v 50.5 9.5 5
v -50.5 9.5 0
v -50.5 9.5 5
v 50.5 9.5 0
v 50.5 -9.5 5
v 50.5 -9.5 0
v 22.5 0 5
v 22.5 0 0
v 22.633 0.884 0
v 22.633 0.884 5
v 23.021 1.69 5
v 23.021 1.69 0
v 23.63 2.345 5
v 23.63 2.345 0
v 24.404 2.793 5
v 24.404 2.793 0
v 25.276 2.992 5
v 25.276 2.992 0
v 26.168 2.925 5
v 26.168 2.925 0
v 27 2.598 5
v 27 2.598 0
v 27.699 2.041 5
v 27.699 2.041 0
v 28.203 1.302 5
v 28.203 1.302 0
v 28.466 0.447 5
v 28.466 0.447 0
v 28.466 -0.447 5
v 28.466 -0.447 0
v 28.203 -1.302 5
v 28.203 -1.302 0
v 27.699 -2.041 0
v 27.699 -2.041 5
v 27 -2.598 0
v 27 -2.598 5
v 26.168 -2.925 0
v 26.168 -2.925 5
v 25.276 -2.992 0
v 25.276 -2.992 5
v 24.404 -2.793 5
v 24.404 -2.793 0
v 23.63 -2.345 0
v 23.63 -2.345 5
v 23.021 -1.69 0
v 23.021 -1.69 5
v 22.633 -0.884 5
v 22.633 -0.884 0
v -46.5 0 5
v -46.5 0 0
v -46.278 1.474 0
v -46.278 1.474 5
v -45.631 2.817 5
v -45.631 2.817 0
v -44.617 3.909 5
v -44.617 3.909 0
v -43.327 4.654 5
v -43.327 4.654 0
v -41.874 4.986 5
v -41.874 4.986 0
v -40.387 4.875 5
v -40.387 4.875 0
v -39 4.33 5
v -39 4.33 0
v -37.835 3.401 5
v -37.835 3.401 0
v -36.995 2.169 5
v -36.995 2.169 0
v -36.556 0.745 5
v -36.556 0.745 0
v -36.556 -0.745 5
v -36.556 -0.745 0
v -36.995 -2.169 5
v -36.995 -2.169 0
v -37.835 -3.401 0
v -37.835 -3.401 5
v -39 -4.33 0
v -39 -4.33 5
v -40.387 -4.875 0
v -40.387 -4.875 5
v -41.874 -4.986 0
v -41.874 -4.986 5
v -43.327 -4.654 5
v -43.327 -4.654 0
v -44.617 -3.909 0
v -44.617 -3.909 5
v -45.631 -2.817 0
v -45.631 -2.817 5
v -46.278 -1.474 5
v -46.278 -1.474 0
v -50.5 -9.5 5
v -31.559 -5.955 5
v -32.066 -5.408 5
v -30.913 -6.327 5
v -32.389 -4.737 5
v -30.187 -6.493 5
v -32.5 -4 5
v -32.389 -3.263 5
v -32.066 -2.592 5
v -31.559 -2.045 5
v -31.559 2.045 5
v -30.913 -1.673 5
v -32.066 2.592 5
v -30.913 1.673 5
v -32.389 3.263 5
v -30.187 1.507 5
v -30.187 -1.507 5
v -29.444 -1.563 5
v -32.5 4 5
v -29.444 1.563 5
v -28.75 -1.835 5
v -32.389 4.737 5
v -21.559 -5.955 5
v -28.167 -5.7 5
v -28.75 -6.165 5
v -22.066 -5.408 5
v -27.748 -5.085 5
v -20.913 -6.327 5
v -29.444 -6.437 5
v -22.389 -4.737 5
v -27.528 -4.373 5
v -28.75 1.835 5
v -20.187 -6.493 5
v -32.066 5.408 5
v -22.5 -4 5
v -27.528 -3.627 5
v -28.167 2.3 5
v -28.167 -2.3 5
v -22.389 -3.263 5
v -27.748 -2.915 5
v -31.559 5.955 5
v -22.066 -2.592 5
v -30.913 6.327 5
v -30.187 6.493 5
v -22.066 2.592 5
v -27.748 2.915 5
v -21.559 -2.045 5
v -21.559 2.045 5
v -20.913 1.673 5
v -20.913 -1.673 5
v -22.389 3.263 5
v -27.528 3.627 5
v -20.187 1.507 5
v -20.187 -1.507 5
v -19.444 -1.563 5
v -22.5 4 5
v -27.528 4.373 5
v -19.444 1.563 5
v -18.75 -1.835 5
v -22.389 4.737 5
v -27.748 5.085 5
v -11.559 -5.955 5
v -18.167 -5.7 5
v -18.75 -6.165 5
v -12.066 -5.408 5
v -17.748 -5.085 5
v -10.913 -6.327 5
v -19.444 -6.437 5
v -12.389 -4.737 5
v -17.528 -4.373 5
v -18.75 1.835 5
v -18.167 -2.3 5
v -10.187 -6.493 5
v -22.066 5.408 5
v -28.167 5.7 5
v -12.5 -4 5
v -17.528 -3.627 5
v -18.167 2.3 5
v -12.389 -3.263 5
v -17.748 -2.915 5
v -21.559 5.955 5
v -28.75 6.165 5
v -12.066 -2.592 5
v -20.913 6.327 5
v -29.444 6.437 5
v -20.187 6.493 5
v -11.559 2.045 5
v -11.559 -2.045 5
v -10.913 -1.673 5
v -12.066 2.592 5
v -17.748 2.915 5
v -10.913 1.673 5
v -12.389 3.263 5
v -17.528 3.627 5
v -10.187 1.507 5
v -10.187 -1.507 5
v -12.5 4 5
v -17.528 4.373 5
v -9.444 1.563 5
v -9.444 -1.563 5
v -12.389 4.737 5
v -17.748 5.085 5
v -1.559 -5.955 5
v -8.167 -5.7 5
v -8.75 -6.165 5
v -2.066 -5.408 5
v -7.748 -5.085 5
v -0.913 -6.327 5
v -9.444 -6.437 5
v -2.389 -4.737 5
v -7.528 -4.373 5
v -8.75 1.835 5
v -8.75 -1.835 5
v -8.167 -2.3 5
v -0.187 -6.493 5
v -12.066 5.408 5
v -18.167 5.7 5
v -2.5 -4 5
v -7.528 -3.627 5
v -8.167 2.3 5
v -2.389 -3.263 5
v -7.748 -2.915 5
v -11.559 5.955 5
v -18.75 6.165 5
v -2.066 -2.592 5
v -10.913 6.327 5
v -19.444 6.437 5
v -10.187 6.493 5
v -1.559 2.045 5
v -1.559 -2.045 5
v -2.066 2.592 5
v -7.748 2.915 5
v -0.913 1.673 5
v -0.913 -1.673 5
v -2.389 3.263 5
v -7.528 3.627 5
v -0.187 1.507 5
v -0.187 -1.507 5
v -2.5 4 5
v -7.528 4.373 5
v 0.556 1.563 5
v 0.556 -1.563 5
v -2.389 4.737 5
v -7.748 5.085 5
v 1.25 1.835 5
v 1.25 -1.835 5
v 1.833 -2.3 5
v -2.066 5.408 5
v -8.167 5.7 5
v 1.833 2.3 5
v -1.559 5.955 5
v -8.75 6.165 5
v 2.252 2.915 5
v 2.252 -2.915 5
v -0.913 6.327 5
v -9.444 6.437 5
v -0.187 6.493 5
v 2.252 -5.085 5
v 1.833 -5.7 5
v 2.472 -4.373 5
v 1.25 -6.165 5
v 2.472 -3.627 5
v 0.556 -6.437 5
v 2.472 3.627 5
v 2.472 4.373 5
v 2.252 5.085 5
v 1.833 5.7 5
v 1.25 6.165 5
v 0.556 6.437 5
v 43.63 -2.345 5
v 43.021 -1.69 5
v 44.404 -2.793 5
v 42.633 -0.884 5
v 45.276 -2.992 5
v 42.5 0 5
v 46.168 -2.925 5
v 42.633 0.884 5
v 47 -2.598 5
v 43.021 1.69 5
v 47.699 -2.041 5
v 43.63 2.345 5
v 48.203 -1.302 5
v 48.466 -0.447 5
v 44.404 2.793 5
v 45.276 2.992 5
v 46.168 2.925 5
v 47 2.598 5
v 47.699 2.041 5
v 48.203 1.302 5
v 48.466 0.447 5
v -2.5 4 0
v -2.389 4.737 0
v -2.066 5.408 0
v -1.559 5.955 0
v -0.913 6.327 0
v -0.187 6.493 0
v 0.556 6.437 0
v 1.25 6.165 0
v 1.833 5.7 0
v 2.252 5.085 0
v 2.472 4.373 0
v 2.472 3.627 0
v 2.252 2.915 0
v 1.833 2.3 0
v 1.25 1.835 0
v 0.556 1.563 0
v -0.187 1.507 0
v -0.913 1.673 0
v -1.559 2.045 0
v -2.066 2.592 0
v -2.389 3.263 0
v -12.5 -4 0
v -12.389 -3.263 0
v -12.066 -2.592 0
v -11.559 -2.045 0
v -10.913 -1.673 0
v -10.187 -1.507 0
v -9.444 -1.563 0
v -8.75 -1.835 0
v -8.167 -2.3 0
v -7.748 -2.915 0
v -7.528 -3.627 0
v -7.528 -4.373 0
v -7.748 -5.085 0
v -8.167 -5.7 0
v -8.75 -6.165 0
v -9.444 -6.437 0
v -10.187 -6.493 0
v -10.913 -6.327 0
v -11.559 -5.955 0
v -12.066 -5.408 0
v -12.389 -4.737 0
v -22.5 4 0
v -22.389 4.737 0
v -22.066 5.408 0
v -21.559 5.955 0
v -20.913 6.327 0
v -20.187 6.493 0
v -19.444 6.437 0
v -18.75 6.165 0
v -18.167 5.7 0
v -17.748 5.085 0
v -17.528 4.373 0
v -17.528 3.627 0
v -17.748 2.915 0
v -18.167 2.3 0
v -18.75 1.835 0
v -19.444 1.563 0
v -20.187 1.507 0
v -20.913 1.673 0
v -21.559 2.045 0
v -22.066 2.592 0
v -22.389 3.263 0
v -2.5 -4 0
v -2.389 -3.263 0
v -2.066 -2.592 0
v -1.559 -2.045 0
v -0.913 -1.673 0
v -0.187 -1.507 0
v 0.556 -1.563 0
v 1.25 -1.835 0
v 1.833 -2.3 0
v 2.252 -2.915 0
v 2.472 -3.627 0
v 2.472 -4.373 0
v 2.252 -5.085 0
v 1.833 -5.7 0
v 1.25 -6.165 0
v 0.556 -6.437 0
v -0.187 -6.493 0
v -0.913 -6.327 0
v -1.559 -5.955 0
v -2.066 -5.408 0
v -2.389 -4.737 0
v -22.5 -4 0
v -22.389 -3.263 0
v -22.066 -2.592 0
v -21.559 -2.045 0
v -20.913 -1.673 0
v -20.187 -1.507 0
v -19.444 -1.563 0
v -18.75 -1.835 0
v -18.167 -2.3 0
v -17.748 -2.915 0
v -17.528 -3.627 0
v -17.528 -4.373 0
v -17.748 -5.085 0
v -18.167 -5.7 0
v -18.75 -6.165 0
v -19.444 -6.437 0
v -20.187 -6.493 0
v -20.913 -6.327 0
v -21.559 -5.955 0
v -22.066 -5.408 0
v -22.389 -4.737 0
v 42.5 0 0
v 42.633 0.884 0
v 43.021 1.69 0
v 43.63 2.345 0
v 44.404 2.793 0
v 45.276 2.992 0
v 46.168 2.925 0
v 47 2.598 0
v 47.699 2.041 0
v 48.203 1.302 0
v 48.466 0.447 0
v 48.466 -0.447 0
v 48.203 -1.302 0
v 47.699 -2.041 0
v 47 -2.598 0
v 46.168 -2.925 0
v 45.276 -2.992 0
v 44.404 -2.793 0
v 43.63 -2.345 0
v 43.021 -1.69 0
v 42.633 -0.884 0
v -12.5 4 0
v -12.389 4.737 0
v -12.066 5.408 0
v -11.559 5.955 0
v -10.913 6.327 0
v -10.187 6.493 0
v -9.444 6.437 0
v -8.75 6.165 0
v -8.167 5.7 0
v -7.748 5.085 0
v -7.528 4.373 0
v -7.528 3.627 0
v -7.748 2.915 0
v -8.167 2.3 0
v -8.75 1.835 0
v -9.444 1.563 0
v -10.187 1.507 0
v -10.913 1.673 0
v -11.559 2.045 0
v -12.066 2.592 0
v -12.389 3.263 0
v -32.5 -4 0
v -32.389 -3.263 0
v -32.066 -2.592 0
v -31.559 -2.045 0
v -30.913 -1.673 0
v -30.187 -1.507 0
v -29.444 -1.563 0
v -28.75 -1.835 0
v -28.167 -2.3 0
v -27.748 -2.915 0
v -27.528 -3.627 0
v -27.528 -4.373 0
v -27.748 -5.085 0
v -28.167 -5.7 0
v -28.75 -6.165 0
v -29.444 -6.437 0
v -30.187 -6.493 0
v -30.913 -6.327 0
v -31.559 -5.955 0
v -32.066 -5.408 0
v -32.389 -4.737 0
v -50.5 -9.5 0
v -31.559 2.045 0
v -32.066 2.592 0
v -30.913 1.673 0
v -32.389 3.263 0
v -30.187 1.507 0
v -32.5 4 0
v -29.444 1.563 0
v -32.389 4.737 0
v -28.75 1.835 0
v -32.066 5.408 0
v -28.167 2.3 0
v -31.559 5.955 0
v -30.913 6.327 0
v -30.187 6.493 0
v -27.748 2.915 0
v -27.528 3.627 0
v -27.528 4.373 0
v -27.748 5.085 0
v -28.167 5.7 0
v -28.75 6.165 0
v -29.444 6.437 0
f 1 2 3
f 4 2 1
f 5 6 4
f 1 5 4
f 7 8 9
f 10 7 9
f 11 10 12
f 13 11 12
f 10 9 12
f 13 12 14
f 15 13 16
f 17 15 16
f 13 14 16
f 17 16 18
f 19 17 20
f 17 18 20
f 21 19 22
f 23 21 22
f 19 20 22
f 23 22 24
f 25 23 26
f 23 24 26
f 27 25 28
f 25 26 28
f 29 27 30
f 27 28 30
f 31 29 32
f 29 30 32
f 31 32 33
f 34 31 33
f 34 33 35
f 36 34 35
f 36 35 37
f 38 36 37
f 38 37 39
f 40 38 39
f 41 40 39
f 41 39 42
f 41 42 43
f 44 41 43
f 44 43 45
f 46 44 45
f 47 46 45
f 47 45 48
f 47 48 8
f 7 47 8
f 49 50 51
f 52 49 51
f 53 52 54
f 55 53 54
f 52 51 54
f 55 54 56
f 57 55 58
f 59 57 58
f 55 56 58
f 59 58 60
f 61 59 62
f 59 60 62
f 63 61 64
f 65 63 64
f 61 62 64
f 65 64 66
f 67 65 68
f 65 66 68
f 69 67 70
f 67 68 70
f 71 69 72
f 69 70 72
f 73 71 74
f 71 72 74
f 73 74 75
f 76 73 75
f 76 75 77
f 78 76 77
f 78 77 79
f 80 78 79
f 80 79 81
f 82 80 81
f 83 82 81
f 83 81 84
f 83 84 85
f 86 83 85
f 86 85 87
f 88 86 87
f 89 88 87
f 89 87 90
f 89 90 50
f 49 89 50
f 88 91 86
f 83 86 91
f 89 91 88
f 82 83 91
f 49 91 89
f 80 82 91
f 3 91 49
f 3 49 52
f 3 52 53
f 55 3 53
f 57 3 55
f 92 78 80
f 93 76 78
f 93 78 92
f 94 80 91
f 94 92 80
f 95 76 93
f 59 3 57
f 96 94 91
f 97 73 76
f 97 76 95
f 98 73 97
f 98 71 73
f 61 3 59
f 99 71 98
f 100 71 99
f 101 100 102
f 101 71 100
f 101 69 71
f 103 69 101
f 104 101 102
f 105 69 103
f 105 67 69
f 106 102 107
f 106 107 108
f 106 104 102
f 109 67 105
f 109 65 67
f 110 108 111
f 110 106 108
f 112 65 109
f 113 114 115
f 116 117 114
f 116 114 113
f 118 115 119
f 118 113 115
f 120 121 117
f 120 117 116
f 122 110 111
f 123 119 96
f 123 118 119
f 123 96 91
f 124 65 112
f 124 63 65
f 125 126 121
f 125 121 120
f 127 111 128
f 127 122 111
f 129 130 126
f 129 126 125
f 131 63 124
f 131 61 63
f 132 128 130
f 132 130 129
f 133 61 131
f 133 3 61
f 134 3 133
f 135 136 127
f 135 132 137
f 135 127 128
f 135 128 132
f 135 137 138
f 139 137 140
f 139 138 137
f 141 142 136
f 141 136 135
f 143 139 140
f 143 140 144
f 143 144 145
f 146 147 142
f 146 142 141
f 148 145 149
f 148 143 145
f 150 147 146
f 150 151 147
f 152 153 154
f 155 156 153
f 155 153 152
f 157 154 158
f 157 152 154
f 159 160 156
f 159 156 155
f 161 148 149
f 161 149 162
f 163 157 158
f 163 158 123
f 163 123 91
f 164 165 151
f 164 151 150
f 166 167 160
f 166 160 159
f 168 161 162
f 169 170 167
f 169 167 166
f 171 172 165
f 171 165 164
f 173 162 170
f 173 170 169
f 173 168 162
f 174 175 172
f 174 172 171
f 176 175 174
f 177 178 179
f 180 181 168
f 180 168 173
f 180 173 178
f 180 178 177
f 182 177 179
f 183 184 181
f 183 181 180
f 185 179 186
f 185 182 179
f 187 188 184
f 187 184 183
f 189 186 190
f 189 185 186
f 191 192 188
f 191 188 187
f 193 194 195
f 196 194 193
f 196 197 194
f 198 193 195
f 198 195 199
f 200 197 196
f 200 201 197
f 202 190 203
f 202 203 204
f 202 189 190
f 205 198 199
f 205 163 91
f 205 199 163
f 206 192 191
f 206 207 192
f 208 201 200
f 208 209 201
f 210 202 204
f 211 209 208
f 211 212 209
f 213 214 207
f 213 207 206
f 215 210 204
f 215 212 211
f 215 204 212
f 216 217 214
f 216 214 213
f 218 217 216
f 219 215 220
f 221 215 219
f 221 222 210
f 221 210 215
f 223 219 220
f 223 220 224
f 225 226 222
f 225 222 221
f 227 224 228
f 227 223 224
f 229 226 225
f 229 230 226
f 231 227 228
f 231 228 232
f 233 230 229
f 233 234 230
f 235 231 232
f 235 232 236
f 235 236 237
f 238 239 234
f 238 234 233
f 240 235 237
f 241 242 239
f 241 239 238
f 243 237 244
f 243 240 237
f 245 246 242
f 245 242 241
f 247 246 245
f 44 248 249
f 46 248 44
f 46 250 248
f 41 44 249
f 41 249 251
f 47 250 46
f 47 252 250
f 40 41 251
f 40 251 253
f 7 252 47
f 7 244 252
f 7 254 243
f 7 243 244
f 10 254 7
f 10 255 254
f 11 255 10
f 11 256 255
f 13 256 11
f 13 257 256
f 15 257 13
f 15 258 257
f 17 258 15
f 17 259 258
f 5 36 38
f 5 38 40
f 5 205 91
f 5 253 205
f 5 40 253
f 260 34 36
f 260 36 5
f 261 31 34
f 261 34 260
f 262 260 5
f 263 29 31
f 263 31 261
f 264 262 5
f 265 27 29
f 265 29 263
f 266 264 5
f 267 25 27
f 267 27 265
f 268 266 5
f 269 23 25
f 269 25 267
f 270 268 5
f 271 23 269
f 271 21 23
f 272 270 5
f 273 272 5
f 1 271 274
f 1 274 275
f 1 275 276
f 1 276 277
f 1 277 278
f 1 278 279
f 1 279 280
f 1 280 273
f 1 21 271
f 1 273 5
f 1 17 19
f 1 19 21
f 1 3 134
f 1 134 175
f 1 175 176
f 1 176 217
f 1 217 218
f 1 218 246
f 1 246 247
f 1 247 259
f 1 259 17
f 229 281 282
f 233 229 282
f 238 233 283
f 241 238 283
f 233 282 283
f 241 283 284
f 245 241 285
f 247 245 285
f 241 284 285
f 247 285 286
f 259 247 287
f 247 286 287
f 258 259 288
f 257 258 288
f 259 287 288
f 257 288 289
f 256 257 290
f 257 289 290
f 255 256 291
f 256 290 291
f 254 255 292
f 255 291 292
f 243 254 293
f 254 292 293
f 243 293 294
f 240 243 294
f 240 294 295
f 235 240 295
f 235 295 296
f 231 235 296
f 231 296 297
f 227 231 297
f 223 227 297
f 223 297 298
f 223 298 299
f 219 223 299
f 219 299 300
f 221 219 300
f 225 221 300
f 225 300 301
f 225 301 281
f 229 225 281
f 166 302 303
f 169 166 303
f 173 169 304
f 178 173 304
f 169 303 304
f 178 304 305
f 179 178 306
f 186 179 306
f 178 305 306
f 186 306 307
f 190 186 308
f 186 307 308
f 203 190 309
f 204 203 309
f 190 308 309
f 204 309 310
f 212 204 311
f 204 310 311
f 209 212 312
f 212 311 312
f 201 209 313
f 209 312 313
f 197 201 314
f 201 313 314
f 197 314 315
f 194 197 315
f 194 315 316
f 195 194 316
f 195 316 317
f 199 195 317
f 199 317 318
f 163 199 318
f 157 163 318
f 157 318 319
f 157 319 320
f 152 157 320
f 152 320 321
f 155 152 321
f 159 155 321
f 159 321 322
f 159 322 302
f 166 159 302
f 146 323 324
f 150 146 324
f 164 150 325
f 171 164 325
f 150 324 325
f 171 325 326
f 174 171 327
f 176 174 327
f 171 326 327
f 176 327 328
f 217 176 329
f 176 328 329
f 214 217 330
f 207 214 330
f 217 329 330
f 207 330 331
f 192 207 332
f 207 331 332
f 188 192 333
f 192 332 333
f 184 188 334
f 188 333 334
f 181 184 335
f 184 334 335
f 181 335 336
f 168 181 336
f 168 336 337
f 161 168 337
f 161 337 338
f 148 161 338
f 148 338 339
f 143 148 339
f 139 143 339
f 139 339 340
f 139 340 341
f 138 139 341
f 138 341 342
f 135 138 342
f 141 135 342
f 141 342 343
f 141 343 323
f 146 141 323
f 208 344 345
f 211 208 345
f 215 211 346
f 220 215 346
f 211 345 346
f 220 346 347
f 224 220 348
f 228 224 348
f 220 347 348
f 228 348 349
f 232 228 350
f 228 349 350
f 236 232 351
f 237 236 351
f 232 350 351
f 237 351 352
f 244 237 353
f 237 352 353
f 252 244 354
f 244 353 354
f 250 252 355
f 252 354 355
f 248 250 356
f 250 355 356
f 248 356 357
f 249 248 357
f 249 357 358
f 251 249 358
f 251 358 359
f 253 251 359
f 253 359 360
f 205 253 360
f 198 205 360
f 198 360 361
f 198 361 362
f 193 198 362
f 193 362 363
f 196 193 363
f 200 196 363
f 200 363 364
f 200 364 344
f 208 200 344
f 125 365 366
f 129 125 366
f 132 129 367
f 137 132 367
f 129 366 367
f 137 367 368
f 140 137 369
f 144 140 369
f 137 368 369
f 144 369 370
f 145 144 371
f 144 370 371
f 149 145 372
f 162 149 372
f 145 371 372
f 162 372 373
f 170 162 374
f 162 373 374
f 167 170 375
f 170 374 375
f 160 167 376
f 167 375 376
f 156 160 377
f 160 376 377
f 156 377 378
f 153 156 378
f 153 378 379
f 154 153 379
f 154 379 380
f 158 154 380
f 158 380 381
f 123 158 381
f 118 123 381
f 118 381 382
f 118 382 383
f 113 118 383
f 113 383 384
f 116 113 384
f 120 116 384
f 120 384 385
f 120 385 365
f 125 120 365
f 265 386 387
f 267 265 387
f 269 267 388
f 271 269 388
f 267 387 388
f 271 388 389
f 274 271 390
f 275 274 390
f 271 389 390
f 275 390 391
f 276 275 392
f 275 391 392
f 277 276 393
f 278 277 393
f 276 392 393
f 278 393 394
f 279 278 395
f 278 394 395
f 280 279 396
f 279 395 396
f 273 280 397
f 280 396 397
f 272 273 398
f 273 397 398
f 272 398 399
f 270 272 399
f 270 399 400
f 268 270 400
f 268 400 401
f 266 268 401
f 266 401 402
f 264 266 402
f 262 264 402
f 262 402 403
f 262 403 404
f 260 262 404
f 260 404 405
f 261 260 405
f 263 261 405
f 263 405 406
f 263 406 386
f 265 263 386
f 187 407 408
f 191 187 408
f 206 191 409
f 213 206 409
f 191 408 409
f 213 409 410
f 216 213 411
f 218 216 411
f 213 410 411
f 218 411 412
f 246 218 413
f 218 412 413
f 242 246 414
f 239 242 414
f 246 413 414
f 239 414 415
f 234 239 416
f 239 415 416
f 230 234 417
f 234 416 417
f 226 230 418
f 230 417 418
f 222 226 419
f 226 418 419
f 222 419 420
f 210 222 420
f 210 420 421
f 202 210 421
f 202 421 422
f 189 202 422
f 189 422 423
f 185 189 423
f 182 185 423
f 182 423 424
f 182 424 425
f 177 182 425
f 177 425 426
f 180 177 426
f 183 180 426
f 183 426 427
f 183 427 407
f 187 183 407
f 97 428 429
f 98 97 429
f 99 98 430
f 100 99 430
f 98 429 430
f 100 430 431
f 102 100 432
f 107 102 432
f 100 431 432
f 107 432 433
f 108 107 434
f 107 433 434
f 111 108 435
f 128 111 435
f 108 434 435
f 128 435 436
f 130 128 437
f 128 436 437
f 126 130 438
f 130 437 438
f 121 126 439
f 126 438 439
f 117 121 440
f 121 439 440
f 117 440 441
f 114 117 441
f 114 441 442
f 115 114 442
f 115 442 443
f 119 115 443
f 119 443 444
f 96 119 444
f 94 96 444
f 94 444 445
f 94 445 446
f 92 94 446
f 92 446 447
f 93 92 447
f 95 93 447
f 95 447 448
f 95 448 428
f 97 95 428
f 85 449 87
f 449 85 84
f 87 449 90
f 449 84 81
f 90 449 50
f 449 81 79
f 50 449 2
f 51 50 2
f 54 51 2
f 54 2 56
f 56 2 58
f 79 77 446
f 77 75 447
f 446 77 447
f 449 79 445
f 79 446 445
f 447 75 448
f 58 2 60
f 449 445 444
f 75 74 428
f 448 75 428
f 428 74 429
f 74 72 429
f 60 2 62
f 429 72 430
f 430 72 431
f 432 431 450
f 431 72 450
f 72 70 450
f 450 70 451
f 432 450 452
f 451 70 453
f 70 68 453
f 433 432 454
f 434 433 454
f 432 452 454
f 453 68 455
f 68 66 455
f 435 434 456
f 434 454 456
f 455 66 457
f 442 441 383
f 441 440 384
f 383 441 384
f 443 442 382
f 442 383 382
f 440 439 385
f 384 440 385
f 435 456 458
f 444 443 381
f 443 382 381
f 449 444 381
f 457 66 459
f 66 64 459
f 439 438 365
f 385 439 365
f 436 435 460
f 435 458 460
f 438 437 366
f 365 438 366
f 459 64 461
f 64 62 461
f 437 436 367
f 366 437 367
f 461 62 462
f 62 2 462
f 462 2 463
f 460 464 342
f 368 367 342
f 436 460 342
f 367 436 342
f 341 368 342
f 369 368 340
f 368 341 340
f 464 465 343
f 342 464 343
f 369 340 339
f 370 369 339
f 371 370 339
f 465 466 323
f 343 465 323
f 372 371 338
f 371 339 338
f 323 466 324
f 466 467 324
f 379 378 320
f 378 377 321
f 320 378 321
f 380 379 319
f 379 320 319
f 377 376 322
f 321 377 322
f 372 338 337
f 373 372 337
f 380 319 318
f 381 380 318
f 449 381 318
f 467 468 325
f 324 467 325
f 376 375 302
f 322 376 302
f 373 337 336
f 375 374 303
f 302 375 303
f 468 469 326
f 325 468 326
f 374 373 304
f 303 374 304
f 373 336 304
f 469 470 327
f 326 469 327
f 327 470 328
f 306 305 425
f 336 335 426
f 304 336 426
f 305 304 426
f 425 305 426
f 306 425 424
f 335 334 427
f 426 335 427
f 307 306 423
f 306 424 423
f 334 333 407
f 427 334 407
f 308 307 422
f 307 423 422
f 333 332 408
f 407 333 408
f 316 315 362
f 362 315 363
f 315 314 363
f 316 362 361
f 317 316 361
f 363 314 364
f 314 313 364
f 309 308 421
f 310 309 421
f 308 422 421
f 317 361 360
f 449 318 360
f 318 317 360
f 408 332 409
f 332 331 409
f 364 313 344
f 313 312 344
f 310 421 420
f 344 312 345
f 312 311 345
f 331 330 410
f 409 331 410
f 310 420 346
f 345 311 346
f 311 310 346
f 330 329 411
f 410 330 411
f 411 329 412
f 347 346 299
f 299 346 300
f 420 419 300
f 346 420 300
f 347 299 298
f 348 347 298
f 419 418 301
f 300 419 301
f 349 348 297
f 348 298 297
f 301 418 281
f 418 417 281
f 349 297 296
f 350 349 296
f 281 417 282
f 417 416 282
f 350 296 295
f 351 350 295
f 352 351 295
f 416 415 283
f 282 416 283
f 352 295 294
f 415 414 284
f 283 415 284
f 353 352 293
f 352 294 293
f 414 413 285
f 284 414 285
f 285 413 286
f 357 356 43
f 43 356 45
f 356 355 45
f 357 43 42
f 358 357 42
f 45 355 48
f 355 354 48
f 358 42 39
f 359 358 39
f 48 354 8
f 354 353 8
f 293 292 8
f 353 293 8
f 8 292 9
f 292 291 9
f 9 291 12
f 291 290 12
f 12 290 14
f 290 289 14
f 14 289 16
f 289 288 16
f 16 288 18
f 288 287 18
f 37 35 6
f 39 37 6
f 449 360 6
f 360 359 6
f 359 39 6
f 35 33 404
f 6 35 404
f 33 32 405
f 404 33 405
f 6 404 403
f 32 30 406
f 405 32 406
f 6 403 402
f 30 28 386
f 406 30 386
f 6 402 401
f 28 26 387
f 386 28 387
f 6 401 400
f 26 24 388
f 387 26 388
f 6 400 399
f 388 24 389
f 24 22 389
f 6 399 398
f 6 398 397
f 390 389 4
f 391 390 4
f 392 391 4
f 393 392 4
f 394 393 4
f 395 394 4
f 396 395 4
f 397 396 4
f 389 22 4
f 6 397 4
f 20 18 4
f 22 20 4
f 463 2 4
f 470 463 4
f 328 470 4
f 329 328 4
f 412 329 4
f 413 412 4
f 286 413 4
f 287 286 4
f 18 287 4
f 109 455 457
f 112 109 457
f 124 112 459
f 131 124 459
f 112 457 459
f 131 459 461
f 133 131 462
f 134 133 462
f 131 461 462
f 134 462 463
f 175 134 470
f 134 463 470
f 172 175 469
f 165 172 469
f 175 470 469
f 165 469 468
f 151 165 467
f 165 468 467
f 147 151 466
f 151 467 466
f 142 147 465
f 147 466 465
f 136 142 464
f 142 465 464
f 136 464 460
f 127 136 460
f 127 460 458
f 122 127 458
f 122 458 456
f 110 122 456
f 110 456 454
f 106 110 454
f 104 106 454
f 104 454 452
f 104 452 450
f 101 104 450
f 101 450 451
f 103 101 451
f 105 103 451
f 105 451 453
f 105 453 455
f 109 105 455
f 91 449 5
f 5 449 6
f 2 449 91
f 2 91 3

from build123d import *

# Parameters (mm, degrees)
F0_W     = 101
F0_H     = 19
F1_DEPTH = 5
F3_D     = 6
F5_D     = 10
F7_D     = 5


with BuildPart() as f1:
    # F0 (on Top) → F1 (new body)
    with BuildSketch(Plane.XY):
        Rectangle(F0_W, F0_H)
    extrude(amount=F1_DEPTH)

    # F3 (through all)
    with Locations(Plane.XY.offset(5)):
        with Locations((25.5, 0), (45.5, 0)):
            Hole(F3_D / 2)

    # F5 (through all)
    with Locations(Plane.XY.offset(5)):
        with Locations((-41.5, 0)):
            Hole(F5_D / 2)

    # F7 (through all)
    with Locations(Plane.XY.offset(5)):
        with Locations((-30, 4), (-20, 4), (-10, 4), (0, 4), (0, -4), (-10, -4), (-20, -4), (-30, -4)):
            Hole(F7_D / 2)


solid = f1.part
